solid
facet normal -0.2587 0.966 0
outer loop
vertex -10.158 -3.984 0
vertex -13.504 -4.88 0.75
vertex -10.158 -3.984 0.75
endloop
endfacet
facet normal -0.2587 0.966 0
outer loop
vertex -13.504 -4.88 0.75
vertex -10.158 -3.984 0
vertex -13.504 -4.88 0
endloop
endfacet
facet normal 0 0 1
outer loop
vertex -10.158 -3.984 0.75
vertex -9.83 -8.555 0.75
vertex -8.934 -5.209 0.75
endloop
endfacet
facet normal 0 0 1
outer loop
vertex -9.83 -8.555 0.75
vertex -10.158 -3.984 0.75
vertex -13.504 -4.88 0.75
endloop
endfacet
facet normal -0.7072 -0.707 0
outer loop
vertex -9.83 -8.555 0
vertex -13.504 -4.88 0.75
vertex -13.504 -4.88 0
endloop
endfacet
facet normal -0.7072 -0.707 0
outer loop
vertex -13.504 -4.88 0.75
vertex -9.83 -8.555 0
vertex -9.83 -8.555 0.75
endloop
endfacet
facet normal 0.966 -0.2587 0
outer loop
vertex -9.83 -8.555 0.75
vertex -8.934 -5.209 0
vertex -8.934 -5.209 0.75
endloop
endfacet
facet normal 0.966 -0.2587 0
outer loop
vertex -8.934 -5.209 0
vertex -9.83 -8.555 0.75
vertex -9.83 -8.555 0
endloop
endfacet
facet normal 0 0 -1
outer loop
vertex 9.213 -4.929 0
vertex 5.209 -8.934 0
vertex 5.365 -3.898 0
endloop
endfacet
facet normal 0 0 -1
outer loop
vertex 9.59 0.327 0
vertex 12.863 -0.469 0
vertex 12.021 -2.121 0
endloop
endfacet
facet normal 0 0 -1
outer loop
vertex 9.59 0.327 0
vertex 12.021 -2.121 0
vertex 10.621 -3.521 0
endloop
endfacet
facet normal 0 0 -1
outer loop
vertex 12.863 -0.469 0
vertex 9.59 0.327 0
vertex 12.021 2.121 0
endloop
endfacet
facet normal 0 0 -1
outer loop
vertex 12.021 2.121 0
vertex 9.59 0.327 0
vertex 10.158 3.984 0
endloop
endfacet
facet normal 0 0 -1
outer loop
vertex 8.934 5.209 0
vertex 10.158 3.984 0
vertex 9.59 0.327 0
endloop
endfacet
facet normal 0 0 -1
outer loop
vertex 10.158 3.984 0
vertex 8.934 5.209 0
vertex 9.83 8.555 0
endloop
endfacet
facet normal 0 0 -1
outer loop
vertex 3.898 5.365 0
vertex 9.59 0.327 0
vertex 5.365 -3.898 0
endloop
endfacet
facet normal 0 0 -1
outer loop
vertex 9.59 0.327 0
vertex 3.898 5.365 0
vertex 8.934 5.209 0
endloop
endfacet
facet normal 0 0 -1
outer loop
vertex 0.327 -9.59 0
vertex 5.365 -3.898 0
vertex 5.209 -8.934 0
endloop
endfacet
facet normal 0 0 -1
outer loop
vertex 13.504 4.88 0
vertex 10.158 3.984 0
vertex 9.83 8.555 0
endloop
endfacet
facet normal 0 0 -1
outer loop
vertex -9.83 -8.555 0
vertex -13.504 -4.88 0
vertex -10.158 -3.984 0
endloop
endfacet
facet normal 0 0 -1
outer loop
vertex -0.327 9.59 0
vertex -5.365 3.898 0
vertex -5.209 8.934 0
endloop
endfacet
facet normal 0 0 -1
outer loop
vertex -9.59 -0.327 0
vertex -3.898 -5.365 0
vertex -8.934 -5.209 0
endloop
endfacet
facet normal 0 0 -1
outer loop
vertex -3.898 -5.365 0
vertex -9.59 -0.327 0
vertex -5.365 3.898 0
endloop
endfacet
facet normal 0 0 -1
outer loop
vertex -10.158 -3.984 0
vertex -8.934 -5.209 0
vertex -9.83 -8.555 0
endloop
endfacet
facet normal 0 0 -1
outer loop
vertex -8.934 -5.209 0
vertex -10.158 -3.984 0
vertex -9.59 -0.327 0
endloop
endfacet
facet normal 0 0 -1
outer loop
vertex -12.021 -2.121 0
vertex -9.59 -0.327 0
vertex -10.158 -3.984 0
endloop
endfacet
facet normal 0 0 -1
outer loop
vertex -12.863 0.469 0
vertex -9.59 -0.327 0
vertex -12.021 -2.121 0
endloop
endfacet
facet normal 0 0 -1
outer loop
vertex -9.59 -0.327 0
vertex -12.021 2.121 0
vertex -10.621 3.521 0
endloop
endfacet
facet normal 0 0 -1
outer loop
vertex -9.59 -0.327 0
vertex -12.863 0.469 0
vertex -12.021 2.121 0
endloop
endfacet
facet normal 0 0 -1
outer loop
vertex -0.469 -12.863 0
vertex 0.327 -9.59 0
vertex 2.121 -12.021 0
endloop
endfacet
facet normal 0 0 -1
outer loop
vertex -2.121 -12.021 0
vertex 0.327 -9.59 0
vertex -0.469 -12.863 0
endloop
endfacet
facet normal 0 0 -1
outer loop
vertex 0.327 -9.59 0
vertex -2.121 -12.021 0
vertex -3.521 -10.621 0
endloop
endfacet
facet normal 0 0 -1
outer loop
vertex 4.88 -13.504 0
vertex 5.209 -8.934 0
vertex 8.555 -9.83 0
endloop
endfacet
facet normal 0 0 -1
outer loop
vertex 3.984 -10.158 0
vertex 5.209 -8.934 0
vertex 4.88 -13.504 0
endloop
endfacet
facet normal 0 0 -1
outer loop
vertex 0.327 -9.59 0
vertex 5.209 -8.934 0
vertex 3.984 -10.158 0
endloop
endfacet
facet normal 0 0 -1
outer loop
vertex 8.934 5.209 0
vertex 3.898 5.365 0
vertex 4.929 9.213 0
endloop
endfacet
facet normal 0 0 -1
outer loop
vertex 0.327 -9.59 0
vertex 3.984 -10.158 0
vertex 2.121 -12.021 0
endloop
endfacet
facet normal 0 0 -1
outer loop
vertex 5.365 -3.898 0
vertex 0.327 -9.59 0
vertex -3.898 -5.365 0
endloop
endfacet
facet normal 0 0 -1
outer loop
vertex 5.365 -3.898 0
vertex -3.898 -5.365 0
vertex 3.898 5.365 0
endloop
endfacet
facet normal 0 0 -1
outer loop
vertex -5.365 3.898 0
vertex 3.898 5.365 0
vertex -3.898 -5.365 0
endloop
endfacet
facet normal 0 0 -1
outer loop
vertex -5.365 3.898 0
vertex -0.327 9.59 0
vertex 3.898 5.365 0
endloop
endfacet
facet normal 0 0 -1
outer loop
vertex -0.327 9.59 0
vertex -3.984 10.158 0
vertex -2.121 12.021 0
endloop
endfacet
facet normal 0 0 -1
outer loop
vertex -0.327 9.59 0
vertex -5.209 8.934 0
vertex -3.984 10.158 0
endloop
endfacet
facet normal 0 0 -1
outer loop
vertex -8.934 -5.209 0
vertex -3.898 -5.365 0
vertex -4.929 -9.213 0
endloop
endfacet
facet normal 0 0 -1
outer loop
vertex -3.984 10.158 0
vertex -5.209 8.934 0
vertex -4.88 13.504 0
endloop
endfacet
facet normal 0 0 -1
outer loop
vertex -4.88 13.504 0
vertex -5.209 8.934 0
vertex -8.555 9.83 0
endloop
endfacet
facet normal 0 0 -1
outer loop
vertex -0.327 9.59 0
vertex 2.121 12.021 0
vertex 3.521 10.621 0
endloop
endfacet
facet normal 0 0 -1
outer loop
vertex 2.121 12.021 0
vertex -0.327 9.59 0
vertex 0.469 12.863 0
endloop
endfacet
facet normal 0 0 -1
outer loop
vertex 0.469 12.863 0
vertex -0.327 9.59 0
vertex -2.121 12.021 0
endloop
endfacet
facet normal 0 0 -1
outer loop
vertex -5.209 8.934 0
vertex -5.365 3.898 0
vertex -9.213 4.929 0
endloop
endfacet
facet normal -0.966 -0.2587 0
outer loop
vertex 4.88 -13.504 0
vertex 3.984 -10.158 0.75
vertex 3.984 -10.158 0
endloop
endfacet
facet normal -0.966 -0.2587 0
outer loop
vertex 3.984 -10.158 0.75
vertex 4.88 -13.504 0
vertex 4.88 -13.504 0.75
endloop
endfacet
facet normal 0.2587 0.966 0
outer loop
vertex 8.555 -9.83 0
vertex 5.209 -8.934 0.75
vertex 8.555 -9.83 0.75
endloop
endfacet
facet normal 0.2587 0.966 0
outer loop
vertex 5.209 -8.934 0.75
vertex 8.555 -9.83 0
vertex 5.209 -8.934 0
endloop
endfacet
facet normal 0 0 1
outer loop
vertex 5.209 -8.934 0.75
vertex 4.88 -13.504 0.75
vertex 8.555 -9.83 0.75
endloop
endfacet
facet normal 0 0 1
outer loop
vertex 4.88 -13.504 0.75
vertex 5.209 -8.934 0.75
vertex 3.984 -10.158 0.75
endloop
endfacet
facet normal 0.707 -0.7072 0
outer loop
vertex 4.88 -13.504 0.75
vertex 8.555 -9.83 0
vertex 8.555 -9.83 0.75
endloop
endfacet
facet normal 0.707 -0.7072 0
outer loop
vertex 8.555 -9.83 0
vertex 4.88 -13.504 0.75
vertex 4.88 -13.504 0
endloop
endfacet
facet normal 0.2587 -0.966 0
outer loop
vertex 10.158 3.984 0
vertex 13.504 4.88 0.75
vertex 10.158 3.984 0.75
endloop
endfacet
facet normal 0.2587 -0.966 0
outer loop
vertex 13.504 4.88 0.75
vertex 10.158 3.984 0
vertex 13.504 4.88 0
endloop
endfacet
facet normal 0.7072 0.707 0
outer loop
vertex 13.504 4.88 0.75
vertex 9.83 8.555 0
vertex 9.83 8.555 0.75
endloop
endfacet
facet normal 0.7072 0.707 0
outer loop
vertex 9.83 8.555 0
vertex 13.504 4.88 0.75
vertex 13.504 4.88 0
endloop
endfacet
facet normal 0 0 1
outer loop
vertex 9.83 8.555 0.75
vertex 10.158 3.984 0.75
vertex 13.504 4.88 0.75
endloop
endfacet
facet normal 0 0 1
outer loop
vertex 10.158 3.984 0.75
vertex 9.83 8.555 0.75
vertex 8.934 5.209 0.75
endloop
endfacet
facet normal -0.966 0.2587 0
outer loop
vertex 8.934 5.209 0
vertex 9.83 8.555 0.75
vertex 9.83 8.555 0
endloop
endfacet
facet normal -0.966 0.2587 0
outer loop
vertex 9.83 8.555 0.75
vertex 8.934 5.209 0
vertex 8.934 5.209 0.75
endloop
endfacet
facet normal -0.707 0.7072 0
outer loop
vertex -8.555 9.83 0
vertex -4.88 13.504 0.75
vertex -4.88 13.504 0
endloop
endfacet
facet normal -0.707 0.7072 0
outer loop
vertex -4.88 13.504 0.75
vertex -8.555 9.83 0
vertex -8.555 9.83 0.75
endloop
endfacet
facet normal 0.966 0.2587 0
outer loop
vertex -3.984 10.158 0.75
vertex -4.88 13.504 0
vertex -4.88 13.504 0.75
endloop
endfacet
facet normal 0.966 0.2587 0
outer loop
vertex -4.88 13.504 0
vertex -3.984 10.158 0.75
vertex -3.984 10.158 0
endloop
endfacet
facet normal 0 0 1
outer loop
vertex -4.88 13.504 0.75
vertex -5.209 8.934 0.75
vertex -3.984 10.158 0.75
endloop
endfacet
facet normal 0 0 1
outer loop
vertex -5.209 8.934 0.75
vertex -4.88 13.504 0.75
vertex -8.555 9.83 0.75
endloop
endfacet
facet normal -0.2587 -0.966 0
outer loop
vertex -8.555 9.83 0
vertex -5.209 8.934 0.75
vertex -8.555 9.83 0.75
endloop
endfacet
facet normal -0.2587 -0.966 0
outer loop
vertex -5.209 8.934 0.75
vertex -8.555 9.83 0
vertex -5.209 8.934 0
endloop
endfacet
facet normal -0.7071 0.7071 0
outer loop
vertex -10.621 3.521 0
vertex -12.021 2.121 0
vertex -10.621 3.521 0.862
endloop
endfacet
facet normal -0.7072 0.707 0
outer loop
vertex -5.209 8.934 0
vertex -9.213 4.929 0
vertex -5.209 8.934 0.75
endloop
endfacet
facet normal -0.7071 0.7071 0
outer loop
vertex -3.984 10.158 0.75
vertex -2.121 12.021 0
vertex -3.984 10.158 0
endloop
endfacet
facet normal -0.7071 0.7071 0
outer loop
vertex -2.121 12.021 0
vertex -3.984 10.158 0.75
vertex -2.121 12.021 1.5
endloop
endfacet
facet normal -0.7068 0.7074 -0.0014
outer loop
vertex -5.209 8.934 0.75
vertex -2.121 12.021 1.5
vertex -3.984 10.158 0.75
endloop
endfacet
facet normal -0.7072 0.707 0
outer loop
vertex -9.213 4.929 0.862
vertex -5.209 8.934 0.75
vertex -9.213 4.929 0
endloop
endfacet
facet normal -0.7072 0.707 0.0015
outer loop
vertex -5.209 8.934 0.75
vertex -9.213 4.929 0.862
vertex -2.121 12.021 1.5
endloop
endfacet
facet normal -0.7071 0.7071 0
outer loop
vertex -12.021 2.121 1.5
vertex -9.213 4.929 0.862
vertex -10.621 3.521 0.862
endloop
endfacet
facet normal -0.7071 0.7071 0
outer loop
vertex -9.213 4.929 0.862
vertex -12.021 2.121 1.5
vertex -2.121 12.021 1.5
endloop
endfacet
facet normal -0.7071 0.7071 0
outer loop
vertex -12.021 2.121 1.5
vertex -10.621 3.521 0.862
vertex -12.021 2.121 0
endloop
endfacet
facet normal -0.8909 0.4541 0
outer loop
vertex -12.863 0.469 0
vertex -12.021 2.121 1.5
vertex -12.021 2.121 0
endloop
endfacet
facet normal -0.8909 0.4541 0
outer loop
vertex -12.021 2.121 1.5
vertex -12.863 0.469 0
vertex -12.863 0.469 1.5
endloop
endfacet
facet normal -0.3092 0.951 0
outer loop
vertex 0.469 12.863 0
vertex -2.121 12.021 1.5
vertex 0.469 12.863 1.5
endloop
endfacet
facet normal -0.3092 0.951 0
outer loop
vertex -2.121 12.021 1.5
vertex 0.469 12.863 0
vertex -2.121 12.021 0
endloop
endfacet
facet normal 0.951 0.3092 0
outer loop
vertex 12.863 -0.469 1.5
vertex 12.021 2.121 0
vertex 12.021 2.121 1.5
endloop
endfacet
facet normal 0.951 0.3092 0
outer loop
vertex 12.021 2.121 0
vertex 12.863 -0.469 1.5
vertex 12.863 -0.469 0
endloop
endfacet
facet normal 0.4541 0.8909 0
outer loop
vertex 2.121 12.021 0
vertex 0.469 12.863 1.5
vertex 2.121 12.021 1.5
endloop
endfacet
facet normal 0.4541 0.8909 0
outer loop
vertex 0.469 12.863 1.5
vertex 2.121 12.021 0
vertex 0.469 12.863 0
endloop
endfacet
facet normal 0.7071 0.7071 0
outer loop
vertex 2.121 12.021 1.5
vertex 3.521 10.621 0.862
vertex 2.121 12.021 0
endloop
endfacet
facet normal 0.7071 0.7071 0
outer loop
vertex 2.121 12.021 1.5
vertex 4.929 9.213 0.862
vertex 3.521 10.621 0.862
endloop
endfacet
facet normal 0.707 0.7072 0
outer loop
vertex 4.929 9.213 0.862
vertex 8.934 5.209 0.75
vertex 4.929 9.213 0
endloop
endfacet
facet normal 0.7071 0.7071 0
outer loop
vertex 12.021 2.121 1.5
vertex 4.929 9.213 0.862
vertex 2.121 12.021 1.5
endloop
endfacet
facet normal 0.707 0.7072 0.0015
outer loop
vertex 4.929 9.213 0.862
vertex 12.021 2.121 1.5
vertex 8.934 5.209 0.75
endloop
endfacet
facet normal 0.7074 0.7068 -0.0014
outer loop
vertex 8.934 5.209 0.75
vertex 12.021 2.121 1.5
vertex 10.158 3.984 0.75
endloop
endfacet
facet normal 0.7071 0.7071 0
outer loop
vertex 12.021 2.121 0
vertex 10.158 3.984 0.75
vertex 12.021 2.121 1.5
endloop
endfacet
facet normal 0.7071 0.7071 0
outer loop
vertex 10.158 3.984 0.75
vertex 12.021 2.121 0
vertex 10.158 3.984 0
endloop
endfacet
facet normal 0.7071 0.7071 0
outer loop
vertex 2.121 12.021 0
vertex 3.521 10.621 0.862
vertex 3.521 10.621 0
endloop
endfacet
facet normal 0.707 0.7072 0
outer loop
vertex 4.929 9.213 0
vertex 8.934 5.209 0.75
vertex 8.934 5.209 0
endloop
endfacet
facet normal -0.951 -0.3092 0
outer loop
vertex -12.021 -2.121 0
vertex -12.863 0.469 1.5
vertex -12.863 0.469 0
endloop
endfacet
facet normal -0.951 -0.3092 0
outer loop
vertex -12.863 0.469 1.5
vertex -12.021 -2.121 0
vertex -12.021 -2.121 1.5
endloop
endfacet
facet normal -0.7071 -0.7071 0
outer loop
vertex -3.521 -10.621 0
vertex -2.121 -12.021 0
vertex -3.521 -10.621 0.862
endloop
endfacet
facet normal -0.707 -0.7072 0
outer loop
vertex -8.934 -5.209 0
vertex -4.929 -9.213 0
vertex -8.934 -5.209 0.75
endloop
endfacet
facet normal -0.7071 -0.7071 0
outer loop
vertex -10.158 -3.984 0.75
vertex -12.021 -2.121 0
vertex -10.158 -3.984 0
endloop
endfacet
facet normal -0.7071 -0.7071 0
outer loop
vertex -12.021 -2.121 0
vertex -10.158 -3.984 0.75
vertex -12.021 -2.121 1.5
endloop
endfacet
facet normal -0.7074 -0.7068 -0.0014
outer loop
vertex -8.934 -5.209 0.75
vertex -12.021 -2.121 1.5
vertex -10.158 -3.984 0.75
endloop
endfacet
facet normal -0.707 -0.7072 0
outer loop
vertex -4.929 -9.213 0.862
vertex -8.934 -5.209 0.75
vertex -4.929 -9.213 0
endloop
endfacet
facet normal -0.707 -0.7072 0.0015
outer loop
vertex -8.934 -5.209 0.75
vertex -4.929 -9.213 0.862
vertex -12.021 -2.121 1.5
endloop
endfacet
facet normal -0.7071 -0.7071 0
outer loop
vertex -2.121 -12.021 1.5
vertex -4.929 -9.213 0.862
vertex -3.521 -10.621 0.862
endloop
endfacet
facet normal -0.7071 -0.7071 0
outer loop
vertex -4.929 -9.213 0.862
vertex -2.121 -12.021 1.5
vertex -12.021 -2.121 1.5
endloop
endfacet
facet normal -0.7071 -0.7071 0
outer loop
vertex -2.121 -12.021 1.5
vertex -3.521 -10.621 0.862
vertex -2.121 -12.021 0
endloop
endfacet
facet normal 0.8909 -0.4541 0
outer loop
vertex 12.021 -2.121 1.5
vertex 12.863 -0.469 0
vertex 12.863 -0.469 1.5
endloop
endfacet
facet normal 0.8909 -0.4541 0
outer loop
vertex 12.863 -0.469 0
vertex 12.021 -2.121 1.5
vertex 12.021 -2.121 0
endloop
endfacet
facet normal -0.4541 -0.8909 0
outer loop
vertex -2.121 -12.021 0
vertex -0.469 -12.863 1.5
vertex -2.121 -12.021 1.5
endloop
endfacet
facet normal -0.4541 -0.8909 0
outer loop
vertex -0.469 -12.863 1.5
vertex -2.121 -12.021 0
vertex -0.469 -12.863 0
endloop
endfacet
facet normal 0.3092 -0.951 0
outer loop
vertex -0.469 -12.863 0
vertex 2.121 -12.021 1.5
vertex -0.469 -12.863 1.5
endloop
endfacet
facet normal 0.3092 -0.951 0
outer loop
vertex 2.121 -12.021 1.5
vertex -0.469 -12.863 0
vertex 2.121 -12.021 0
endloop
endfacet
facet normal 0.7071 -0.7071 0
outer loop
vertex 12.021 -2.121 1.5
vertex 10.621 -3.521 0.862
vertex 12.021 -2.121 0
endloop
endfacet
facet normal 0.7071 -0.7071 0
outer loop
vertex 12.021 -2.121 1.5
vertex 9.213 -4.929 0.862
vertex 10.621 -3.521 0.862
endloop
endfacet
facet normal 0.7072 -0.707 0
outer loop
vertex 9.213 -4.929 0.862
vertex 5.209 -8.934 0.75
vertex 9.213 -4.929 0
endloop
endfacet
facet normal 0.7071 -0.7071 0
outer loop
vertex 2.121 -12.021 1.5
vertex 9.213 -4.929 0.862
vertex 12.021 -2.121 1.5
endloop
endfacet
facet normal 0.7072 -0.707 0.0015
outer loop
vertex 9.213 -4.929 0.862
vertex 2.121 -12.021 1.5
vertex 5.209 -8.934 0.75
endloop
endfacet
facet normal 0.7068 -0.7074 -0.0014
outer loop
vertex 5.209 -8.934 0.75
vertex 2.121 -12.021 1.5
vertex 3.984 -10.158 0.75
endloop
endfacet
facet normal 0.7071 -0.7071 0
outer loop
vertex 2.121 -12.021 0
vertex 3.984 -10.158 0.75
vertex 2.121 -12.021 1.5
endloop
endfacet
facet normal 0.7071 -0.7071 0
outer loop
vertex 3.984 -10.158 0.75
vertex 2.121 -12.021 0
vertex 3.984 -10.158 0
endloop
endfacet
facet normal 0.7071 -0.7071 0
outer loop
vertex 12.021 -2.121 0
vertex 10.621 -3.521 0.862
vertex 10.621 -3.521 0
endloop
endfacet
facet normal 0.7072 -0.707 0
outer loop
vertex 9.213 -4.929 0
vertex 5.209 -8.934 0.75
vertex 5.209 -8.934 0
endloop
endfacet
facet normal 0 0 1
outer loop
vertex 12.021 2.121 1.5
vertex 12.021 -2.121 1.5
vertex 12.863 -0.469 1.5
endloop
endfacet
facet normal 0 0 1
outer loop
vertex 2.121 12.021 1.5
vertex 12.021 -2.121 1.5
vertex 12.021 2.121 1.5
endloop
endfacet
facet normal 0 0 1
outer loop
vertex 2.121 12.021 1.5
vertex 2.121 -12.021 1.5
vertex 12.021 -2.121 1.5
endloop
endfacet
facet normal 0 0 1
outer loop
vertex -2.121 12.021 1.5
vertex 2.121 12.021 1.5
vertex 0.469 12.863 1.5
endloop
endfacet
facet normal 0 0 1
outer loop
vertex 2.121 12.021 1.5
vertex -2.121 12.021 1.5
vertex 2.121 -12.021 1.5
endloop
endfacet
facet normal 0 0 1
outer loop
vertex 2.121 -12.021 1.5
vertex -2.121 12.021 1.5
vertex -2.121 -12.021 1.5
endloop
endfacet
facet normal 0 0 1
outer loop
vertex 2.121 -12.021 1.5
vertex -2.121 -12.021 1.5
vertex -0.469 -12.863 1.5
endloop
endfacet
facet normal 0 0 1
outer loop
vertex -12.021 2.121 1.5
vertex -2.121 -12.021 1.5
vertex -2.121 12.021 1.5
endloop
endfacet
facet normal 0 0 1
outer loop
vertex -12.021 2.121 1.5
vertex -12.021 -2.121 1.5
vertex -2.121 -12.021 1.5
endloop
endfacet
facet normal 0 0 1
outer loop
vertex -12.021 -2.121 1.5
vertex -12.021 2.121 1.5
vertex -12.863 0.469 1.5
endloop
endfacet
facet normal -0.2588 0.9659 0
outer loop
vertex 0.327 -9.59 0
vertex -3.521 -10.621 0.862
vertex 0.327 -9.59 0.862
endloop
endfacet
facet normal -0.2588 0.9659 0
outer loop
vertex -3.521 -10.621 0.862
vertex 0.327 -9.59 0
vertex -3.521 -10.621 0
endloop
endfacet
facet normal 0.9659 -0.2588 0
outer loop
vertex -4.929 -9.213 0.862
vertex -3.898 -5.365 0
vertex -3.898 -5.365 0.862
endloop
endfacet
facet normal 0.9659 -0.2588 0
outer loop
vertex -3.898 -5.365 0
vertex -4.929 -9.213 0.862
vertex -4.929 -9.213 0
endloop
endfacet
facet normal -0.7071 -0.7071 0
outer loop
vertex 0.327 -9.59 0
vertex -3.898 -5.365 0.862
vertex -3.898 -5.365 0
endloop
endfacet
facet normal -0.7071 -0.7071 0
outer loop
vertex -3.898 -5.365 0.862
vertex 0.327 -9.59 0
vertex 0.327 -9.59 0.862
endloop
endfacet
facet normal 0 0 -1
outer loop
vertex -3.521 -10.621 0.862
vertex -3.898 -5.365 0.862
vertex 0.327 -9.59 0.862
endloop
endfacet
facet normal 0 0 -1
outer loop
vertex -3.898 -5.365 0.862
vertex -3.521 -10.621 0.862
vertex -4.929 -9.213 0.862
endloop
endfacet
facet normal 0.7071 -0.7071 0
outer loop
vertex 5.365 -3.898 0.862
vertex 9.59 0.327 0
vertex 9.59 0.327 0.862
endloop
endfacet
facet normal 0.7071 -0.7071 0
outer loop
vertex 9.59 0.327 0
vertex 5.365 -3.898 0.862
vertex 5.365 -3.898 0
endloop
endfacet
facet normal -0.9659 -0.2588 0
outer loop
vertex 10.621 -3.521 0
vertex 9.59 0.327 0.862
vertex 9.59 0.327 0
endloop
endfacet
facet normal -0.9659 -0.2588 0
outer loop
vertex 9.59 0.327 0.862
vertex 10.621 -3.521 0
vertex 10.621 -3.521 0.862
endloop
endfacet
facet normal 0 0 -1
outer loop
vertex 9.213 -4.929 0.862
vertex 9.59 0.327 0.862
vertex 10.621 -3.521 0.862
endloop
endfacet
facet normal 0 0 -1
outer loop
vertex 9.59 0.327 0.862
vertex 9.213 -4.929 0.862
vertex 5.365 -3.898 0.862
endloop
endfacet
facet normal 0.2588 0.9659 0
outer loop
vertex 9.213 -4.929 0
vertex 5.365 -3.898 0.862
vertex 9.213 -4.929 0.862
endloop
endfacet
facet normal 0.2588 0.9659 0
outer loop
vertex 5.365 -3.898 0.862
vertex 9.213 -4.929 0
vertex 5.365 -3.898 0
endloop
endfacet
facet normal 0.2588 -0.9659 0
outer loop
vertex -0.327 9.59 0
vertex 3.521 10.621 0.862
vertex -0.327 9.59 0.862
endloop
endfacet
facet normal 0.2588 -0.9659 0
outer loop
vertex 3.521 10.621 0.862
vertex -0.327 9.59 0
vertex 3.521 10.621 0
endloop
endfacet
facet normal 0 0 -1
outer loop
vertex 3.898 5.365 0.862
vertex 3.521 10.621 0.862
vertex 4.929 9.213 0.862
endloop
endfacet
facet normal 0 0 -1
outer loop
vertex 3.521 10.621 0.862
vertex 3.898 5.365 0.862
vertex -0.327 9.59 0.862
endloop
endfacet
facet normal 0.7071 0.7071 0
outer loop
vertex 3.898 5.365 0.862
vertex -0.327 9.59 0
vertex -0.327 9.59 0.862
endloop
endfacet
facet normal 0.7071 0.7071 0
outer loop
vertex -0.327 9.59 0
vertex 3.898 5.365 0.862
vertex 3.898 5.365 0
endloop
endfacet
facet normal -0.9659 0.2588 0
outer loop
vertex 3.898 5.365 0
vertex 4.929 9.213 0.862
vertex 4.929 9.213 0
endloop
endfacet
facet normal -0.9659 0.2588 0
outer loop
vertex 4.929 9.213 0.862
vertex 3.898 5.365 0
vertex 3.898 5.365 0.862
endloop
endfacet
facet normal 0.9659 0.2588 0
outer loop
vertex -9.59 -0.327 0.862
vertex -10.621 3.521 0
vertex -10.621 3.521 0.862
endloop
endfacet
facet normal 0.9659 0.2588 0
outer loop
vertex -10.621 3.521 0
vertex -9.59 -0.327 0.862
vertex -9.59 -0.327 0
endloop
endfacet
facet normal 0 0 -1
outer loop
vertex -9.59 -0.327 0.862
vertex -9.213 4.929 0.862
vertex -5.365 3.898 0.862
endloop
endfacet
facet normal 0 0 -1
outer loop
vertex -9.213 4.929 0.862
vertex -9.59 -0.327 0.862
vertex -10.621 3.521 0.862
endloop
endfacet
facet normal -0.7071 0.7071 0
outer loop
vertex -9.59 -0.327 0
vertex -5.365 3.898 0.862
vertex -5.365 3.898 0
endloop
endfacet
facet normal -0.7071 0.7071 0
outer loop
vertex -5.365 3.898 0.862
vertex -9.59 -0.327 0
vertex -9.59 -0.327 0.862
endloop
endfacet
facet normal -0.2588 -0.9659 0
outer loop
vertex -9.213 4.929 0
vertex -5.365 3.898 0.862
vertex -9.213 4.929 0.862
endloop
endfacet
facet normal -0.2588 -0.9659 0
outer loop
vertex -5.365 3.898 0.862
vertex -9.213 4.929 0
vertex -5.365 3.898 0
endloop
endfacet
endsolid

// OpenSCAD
// file: shapes.scad
function polySide2R(side,n) = side/(2*sin(180/n));
function R2a(R,n) = R*cos(180/n);

module roundedPolygon(side, h,sides=4,r=1){
    H = r / cos(180/sides);
    linear_extrude(height=h)
    offset(r = r)
        circle(polySide2R(side,sides)-H,$fn=sides);
}

module regularPolygon(side,h, sides=4){
    cylinder(r=polySide2R(side,sides),h=h,$fn=sides);
}

//roundedPolygon(10,2,6,3);
//translate([0,0,2])regularPolygon(10,2,6);

module puzzleCon(s,h,$fn=15){
    
    difference(){
        union(){
        translate([-s*3/4,0,0]) scale([1,1.25,1]) cylinder(d=s,h=h);
        translate([-s/2,-s/2,0]) cube([s/2,s,h]);
        }
        translate([-s/4,-s/2,0]) cylinder(r=s/4,h=h);
        translate([-s/4,+s/2,0]) cylinder(r=s/4,h=h);
    }
}

module triangleCon(ConnectorSize,h){
    translate([-ConnectorSize/4,0,0]) cylinder(d=ConnectorSize,h=h,$fn=3);
}

module rectangleCon(ConnectorSize,h){
    mirror([1,0,0]) union(){
                translate([0,-ConnectorSize/4,0]) 
                cube([ConnectorSize/2,ConnectorSize/2,h]);
                translate([ConnectorSize/2,-ConnectorSize/2,0])
                cube([ConnectorSize/2,ConnectorSize,h]);
            };
}
// main file
include <shapes.scad>

module tessellarDoubleConnect(d,t=0,sides=4,deltaAngle=0){
    D=360/sides;
    difference(){
        union(){
            children(0);
            for (a = [deltaAngle:D:359+deltaAngle]) {
                rotate([0,0,a]) 
                    translate([-d/2,0,0]) 
                        children(1);
            }
        }
        for (a = [deltaAngle:D:359+deltaAngle]) {
                rotate([0,0,a]) 
                  translate([-d/2,0,0]) 
                  mirror([0,1,0]) mirror([1,0,0]) 
                  scale(1+t)
                     children(1);
        }
    }
}

/*
 * Tile Parameters
 */
NSides=4;
SideLength=20;
Height=1.5;
Roundness=3;

/*
 * Conenction
 */
ConnectionGeometry="triangle"; //[triangle,puzzle,rectangle,loop]
ConnectionRatio=0.5;//(0,1]
ConnectionDelta=7; // only for "double" ConnectionType
ConnectionTolerance=0.15; // percentage for making the negative part bigger
ConnectorSize=6;

R=R2a(polySide2R(SideLength,NSides),NSides);

tessellarDoubleConnect(R*2,t=ConnectionTolerance,sides=NSides,deltaAngle=(NSides % 2 +1) * 180/(NSides)){
    roundedPolygon(SideLength,Height,NSides,Roundness);
    
    translate([0,ConnectionDelta/2,0])
    if(ConnectionGeometry=="triangle"){
        triangleCon(ConnectorSize,Height*ConnectionRatio);
    }
    else if(ConnectionGeometry=="puzzle"){
        puzzleCon(ConnectorSize,Height*ConnectionRatio);
    }
    else if(ConnectionGeometry=="rectangle"){
        rectangleCon(ConnectorSize,Height*ConnectionRatio);
    }
}
